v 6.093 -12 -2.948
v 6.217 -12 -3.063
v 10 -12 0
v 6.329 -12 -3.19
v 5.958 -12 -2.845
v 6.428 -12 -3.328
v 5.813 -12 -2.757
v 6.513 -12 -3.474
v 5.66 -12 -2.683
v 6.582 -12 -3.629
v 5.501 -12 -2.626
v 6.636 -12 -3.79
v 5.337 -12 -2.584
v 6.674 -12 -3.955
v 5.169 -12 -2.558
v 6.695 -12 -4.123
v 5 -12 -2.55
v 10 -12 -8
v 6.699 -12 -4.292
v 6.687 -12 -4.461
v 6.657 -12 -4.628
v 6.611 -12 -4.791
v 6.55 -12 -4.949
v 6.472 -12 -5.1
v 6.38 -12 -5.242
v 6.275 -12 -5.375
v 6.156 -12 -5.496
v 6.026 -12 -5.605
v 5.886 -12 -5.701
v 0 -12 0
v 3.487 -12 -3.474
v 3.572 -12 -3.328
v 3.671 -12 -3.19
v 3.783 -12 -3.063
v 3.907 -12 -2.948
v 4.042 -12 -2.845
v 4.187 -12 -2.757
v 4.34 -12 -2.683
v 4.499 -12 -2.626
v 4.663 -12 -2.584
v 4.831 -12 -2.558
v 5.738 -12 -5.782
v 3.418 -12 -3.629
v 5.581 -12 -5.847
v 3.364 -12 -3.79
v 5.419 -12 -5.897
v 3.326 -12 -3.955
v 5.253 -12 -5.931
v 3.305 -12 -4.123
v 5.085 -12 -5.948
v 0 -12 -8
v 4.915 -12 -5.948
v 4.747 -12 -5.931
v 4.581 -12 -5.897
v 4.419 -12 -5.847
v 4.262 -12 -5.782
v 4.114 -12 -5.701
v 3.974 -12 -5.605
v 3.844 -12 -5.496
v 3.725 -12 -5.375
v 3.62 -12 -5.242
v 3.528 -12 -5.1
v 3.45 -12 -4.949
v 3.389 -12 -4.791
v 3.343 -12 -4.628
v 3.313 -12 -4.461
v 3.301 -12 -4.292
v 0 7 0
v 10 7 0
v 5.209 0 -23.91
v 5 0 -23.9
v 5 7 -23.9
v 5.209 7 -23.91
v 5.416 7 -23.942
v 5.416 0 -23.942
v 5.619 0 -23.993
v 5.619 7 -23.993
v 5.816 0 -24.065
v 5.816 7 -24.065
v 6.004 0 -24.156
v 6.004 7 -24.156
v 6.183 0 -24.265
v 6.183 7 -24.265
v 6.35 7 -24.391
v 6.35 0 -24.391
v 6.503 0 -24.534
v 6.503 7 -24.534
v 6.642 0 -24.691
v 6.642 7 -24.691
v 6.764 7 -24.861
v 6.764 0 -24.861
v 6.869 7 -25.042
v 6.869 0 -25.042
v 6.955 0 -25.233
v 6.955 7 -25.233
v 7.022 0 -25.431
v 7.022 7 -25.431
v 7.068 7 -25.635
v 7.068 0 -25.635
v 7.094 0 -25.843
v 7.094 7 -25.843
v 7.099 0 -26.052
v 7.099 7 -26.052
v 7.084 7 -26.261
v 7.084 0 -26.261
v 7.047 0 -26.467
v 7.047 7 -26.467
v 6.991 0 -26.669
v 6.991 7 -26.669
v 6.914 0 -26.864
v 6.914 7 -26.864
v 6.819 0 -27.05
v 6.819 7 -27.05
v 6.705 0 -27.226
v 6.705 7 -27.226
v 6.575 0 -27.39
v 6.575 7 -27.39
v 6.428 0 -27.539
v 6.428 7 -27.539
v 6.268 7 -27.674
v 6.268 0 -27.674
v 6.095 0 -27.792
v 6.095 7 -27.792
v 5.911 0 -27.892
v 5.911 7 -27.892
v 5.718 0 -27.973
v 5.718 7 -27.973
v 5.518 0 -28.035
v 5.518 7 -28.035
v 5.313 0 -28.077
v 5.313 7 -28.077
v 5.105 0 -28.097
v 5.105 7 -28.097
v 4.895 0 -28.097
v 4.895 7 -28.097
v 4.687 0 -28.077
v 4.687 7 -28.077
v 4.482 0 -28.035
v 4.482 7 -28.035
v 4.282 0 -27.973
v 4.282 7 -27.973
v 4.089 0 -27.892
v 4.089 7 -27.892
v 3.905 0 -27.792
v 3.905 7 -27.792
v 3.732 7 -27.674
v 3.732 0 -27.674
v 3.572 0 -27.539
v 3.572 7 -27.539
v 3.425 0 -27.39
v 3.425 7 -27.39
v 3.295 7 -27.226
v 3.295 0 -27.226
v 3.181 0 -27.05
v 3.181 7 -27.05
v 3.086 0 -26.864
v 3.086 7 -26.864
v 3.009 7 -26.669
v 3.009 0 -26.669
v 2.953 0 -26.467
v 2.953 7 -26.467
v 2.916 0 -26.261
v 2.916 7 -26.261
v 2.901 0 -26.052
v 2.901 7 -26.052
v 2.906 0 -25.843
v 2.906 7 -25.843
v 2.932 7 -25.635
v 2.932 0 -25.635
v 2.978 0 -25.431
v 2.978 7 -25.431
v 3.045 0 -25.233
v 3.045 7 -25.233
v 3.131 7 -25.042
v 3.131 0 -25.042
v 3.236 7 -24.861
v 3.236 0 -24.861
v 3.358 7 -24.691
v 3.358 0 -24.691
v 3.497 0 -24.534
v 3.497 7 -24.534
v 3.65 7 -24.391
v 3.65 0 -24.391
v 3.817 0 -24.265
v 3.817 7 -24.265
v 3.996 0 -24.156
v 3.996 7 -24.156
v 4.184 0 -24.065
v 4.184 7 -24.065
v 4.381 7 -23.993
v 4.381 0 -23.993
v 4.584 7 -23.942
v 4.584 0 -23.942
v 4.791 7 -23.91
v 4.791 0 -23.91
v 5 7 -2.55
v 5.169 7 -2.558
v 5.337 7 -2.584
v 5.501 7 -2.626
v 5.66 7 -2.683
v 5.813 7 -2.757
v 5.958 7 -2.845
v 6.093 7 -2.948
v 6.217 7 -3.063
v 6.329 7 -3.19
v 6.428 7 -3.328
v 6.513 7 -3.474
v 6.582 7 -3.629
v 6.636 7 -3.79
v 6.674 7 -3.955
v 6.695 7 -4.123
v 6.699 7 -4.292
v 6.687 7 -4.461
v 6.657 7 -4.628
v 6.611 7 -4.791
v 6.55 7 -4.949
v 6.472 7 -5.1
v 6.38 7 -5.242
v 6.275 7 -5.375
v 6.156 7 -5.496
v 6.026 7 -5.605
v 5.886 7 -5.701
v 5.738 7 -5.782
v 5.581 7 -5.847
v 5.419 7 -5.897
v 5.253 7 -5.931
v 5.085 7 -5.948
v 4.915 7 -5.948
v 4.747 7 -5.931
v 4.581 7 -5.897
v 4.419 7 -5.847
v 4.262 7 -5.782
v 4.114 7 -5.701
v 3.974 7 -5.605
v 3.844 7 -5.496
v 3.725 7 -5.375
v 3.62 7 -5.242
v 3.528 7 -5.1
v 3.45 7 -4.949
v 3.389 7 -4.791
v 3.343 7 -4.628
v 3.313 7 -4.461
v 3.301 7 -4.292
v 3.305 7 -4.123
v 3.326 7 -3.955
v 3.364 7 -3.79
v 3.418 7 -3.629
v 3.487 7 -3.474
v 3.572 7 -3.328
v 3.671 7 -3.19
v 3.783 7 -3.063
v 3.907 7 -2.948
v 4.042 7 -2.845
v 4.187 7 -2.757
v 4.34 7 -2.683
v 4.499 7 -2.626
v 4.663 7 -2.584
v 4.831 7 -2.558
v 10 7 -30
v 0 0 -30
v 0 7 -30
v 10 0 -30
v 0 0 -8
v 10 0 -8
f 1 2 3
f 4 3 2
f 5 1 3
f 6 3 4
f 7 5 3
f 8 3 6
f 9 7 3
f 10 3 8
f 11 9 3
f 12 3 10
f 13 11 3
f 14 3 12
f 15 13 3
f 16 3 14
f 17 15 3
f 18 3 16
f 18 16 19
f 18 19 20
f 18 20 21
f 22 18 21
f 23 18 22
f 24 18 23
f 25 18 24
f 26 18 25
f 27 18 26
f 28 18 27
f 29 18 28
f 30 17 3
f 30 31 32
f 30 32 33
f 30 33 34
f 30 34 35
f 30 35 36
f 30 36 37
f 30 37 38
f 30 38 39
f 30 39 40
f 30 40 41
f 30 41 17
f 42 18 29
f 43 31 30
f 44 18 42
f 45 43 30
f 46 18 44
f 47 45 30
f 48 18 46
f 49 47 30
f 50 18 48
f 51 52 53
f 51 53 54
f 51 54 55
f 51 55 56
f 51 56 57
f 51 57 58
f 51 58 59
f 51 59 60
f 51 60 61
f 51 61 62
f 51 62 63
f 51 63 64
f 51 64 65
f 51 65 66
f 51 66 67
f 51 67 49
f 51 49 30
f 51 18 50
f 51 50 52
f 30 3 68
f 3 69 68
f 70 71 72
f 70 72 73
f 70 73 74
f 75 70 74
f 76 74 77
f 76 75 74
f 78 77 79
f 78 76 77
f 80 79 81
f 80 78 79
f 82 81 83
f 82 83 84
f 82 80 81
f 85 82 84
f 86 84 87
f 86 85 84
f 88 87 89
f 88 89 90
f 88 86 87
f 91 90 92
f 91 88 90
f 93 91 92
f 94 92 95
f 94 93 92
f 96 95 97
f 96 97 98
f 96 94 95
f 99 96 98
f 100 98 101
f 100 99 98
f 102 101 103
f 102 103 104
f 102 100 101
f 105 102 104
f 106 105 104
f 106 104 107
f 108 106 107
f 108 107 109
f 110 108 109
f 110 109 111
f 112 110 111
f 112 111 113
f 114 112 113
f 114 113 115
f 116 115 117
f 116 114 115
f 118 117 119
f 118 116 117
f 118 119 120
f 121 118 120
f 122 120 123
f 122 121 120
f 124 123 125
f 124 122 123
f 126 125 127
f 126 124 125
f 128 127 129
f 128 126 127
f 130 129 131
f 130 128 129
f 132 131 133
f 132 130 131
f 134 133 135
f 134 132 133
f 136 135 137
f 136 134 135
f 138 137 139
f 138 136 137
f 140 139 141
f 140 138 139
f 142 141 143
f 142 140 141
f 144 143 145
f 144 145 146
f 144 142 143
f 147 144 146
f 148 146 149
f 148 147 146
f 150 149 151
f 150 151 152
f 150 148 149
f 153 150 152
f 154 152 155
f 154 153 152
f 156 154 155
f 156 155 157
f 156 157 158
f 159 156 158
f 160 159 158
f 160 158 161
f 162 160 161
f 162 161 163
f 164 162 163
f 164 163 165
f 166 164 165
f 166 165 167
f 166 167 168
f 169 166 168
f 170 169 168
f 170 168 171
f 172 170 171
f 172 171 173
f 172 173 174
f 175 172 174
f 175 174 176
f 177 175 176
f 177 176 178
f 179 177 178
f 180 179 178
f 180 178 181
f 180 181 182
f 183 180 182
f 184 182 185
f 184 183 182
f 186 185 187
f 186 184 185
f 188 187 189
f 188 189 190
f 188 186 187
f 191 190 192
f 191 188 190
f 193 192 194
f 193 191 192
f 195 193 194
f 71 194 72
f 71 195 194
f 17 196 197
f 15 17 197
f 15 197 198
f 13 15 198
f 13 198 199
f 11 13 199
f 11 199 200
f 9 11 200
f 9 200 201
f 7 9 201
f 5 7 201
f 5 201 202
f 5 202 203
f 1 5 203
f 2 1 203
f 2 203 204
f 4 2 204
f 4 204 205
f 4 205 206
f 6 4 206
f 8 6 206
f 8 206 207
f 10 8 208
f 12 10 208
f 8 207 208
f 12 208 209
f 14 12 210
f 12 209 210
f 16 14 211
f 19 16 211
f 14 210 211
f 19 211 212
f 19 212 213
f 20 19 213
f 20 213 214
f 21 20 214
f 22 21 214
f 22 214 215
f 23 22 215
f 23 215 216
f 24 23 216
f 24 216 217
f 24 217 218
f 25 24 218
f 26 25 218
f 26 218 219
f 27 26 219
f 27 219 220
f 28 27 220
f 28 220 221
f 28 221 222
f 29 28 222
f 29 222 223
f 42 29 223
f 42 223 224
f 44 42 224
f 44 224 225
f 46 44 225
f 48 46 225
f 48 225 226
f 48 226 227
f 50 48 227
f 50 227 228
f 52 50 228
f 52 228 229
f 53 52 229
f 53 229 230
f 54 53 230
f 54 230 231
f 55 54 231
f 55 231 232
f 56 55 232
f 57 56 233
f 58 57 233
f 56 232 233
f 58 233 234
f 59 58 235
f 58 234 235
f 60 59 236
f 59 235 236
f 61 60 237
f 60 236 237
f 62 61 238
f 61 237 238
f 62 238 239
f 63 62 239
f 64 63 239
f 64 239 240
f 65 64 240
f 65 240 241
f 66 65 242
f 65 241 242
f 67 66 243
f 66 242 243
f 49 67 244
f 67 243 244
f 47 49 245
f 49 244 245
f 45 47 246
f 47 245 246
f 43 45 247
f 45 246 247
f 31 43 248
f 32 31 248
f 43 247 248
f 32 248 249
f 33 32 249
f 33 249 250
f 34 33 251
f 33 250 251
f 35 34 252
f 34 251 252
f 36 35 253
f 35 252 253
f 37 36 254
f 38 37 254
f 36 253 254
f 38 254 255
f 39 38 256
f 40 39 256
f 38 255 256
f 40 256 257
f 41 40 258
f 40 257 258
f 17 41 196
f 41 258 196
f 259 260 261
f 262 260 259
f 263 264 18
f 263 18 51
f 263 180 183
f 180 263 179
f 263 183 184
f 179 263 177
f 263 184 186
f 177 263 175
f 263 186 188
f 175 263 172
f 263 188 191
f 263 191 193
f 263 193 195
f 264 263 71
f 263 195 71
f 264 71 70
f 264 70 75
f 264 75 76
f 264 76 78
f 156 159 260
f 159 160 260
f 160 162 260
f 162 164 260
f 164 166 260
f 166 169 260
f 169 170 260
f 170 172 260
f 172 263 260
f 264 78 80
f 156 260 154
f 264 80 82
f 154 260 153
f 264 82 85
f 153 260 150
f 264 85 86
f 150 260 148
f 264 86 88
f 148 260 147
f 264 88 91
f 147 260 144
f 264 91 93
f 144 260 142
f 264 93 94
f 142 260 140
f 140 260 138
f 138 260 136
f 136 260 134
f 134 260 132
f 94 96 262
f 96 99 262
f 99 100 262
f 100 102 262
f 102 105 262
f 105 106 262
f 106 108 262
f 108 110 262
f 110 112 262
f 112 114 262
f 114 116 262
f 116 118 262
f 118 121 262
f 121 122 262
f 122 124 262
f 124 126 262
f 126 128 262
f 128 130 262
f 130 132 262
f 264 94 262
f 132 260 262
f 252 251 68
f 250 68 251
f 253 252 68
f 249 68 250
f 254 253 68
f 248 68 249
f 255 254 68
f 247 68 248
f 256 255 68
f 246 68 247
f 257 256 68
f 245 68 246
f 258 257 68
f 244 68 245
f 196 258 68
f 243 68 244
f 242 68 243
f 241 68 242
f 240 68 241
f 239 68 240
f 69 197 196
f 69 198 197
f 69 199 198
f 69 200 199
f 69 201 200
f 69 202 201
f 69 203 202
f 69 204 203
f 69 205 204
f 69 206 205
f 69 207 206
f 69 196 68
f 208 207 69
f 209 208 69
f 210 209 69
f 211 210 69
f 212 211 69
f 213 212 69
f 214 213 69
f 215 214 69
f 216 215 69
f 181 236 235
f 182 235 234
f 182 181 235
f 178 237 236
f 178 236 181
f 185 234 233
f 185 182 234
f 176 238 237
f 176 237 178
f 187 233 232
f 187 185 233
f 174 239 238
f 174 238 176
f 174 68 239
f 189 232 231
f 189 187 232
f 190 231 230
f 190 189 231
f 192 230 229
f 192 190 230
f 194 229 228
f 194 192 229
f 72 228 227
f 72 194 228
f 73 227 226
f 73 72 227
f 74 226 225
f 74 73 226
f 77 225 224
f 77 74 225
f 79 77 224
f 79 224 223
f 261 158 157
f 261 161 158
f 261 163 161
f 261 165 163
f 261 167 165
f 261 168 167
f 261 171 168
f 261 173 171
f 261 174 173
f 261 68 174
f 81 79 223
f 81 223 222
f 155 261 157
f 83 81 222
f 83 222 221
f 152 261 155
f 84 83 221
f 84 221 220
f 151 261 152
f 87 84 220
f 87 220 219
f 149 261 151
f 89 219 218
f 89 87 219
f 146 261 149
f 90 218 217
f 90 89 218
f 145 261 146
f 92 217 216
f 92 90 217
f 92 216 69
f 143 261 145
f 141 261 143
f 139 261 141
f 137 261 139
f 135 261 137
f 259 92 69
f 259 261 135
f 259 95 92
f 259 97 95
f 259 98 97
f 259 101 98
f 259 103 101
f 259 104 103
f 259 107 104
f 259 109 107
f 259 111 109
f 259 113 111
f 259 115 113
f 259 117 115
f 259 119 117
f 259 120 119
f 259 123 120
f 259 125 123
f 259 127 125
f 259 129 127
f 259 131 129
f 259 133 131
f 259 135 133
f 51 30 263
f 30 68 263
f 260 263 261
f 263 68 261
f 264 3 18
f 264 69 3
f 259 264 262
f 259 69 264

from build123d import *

# Parameters (mm, degrees)
SKETCH1_W           = 10
SKETCH1_H           = 30
SKETCH1_R           = 2.1
BOSS_EXTRUDE1_DEPTH = 7
SKETCH2_W           = 10
SKETCH2_H           = 8
BOSS_EXTRUDE2_DEPTH = 12
SKETCH3_R           = 1.7
CUT_EXTRUDE1_DEPTH  = 37.891733491


with BuildPart() as part:
    # Sketch1 → Boss-Extrude1 (new body)
    with BuildSketch(Plane(origin=(0, 0, 0), x_dir=(1, 0, 0), z_dir=(0, 1, 0))):
        with Locations((5, 15)):
            Rectangle(SKETCH1_W, SKETCH1_H)
        with Locations(Location((5, 26, 0), (0, 0, 270))):
            Circle(SKETCH1_R, mode=Mode.SUBTRACT)
    extrude(amount=BOSS_EXTRUDE1_DEPTH)

    # Sketch2 → Boss-Extrude2 (add)
    with BuildSketch(Plane(origin=(0, 0, 0), x_dir=(-1, 0, 0), z_dir=(0, -1, 0))):
        with Locations((-5, 4)):
            Rectangle(SKETCH2_W, SKETCH2_H)
    extrude(amount=BOSS_EXTRUDE2_DEPTH)

    # Sketch3 → Cut-Extrude1 (cut, through all)
    with BuildSketch(Plane(origin=(0, 7, 0), x_dir=(1, 0, 0), z_dir=(0, 1, 0))):
        with Locations(Location((5, 4.25, 0), (0, 0, 270))):
            Circle(SKETCH3_R)
    extrude(amount=-CUT_EXTRUDE1_DEPTH, mode=Mode.SUBTRACT)


solid = part.part
